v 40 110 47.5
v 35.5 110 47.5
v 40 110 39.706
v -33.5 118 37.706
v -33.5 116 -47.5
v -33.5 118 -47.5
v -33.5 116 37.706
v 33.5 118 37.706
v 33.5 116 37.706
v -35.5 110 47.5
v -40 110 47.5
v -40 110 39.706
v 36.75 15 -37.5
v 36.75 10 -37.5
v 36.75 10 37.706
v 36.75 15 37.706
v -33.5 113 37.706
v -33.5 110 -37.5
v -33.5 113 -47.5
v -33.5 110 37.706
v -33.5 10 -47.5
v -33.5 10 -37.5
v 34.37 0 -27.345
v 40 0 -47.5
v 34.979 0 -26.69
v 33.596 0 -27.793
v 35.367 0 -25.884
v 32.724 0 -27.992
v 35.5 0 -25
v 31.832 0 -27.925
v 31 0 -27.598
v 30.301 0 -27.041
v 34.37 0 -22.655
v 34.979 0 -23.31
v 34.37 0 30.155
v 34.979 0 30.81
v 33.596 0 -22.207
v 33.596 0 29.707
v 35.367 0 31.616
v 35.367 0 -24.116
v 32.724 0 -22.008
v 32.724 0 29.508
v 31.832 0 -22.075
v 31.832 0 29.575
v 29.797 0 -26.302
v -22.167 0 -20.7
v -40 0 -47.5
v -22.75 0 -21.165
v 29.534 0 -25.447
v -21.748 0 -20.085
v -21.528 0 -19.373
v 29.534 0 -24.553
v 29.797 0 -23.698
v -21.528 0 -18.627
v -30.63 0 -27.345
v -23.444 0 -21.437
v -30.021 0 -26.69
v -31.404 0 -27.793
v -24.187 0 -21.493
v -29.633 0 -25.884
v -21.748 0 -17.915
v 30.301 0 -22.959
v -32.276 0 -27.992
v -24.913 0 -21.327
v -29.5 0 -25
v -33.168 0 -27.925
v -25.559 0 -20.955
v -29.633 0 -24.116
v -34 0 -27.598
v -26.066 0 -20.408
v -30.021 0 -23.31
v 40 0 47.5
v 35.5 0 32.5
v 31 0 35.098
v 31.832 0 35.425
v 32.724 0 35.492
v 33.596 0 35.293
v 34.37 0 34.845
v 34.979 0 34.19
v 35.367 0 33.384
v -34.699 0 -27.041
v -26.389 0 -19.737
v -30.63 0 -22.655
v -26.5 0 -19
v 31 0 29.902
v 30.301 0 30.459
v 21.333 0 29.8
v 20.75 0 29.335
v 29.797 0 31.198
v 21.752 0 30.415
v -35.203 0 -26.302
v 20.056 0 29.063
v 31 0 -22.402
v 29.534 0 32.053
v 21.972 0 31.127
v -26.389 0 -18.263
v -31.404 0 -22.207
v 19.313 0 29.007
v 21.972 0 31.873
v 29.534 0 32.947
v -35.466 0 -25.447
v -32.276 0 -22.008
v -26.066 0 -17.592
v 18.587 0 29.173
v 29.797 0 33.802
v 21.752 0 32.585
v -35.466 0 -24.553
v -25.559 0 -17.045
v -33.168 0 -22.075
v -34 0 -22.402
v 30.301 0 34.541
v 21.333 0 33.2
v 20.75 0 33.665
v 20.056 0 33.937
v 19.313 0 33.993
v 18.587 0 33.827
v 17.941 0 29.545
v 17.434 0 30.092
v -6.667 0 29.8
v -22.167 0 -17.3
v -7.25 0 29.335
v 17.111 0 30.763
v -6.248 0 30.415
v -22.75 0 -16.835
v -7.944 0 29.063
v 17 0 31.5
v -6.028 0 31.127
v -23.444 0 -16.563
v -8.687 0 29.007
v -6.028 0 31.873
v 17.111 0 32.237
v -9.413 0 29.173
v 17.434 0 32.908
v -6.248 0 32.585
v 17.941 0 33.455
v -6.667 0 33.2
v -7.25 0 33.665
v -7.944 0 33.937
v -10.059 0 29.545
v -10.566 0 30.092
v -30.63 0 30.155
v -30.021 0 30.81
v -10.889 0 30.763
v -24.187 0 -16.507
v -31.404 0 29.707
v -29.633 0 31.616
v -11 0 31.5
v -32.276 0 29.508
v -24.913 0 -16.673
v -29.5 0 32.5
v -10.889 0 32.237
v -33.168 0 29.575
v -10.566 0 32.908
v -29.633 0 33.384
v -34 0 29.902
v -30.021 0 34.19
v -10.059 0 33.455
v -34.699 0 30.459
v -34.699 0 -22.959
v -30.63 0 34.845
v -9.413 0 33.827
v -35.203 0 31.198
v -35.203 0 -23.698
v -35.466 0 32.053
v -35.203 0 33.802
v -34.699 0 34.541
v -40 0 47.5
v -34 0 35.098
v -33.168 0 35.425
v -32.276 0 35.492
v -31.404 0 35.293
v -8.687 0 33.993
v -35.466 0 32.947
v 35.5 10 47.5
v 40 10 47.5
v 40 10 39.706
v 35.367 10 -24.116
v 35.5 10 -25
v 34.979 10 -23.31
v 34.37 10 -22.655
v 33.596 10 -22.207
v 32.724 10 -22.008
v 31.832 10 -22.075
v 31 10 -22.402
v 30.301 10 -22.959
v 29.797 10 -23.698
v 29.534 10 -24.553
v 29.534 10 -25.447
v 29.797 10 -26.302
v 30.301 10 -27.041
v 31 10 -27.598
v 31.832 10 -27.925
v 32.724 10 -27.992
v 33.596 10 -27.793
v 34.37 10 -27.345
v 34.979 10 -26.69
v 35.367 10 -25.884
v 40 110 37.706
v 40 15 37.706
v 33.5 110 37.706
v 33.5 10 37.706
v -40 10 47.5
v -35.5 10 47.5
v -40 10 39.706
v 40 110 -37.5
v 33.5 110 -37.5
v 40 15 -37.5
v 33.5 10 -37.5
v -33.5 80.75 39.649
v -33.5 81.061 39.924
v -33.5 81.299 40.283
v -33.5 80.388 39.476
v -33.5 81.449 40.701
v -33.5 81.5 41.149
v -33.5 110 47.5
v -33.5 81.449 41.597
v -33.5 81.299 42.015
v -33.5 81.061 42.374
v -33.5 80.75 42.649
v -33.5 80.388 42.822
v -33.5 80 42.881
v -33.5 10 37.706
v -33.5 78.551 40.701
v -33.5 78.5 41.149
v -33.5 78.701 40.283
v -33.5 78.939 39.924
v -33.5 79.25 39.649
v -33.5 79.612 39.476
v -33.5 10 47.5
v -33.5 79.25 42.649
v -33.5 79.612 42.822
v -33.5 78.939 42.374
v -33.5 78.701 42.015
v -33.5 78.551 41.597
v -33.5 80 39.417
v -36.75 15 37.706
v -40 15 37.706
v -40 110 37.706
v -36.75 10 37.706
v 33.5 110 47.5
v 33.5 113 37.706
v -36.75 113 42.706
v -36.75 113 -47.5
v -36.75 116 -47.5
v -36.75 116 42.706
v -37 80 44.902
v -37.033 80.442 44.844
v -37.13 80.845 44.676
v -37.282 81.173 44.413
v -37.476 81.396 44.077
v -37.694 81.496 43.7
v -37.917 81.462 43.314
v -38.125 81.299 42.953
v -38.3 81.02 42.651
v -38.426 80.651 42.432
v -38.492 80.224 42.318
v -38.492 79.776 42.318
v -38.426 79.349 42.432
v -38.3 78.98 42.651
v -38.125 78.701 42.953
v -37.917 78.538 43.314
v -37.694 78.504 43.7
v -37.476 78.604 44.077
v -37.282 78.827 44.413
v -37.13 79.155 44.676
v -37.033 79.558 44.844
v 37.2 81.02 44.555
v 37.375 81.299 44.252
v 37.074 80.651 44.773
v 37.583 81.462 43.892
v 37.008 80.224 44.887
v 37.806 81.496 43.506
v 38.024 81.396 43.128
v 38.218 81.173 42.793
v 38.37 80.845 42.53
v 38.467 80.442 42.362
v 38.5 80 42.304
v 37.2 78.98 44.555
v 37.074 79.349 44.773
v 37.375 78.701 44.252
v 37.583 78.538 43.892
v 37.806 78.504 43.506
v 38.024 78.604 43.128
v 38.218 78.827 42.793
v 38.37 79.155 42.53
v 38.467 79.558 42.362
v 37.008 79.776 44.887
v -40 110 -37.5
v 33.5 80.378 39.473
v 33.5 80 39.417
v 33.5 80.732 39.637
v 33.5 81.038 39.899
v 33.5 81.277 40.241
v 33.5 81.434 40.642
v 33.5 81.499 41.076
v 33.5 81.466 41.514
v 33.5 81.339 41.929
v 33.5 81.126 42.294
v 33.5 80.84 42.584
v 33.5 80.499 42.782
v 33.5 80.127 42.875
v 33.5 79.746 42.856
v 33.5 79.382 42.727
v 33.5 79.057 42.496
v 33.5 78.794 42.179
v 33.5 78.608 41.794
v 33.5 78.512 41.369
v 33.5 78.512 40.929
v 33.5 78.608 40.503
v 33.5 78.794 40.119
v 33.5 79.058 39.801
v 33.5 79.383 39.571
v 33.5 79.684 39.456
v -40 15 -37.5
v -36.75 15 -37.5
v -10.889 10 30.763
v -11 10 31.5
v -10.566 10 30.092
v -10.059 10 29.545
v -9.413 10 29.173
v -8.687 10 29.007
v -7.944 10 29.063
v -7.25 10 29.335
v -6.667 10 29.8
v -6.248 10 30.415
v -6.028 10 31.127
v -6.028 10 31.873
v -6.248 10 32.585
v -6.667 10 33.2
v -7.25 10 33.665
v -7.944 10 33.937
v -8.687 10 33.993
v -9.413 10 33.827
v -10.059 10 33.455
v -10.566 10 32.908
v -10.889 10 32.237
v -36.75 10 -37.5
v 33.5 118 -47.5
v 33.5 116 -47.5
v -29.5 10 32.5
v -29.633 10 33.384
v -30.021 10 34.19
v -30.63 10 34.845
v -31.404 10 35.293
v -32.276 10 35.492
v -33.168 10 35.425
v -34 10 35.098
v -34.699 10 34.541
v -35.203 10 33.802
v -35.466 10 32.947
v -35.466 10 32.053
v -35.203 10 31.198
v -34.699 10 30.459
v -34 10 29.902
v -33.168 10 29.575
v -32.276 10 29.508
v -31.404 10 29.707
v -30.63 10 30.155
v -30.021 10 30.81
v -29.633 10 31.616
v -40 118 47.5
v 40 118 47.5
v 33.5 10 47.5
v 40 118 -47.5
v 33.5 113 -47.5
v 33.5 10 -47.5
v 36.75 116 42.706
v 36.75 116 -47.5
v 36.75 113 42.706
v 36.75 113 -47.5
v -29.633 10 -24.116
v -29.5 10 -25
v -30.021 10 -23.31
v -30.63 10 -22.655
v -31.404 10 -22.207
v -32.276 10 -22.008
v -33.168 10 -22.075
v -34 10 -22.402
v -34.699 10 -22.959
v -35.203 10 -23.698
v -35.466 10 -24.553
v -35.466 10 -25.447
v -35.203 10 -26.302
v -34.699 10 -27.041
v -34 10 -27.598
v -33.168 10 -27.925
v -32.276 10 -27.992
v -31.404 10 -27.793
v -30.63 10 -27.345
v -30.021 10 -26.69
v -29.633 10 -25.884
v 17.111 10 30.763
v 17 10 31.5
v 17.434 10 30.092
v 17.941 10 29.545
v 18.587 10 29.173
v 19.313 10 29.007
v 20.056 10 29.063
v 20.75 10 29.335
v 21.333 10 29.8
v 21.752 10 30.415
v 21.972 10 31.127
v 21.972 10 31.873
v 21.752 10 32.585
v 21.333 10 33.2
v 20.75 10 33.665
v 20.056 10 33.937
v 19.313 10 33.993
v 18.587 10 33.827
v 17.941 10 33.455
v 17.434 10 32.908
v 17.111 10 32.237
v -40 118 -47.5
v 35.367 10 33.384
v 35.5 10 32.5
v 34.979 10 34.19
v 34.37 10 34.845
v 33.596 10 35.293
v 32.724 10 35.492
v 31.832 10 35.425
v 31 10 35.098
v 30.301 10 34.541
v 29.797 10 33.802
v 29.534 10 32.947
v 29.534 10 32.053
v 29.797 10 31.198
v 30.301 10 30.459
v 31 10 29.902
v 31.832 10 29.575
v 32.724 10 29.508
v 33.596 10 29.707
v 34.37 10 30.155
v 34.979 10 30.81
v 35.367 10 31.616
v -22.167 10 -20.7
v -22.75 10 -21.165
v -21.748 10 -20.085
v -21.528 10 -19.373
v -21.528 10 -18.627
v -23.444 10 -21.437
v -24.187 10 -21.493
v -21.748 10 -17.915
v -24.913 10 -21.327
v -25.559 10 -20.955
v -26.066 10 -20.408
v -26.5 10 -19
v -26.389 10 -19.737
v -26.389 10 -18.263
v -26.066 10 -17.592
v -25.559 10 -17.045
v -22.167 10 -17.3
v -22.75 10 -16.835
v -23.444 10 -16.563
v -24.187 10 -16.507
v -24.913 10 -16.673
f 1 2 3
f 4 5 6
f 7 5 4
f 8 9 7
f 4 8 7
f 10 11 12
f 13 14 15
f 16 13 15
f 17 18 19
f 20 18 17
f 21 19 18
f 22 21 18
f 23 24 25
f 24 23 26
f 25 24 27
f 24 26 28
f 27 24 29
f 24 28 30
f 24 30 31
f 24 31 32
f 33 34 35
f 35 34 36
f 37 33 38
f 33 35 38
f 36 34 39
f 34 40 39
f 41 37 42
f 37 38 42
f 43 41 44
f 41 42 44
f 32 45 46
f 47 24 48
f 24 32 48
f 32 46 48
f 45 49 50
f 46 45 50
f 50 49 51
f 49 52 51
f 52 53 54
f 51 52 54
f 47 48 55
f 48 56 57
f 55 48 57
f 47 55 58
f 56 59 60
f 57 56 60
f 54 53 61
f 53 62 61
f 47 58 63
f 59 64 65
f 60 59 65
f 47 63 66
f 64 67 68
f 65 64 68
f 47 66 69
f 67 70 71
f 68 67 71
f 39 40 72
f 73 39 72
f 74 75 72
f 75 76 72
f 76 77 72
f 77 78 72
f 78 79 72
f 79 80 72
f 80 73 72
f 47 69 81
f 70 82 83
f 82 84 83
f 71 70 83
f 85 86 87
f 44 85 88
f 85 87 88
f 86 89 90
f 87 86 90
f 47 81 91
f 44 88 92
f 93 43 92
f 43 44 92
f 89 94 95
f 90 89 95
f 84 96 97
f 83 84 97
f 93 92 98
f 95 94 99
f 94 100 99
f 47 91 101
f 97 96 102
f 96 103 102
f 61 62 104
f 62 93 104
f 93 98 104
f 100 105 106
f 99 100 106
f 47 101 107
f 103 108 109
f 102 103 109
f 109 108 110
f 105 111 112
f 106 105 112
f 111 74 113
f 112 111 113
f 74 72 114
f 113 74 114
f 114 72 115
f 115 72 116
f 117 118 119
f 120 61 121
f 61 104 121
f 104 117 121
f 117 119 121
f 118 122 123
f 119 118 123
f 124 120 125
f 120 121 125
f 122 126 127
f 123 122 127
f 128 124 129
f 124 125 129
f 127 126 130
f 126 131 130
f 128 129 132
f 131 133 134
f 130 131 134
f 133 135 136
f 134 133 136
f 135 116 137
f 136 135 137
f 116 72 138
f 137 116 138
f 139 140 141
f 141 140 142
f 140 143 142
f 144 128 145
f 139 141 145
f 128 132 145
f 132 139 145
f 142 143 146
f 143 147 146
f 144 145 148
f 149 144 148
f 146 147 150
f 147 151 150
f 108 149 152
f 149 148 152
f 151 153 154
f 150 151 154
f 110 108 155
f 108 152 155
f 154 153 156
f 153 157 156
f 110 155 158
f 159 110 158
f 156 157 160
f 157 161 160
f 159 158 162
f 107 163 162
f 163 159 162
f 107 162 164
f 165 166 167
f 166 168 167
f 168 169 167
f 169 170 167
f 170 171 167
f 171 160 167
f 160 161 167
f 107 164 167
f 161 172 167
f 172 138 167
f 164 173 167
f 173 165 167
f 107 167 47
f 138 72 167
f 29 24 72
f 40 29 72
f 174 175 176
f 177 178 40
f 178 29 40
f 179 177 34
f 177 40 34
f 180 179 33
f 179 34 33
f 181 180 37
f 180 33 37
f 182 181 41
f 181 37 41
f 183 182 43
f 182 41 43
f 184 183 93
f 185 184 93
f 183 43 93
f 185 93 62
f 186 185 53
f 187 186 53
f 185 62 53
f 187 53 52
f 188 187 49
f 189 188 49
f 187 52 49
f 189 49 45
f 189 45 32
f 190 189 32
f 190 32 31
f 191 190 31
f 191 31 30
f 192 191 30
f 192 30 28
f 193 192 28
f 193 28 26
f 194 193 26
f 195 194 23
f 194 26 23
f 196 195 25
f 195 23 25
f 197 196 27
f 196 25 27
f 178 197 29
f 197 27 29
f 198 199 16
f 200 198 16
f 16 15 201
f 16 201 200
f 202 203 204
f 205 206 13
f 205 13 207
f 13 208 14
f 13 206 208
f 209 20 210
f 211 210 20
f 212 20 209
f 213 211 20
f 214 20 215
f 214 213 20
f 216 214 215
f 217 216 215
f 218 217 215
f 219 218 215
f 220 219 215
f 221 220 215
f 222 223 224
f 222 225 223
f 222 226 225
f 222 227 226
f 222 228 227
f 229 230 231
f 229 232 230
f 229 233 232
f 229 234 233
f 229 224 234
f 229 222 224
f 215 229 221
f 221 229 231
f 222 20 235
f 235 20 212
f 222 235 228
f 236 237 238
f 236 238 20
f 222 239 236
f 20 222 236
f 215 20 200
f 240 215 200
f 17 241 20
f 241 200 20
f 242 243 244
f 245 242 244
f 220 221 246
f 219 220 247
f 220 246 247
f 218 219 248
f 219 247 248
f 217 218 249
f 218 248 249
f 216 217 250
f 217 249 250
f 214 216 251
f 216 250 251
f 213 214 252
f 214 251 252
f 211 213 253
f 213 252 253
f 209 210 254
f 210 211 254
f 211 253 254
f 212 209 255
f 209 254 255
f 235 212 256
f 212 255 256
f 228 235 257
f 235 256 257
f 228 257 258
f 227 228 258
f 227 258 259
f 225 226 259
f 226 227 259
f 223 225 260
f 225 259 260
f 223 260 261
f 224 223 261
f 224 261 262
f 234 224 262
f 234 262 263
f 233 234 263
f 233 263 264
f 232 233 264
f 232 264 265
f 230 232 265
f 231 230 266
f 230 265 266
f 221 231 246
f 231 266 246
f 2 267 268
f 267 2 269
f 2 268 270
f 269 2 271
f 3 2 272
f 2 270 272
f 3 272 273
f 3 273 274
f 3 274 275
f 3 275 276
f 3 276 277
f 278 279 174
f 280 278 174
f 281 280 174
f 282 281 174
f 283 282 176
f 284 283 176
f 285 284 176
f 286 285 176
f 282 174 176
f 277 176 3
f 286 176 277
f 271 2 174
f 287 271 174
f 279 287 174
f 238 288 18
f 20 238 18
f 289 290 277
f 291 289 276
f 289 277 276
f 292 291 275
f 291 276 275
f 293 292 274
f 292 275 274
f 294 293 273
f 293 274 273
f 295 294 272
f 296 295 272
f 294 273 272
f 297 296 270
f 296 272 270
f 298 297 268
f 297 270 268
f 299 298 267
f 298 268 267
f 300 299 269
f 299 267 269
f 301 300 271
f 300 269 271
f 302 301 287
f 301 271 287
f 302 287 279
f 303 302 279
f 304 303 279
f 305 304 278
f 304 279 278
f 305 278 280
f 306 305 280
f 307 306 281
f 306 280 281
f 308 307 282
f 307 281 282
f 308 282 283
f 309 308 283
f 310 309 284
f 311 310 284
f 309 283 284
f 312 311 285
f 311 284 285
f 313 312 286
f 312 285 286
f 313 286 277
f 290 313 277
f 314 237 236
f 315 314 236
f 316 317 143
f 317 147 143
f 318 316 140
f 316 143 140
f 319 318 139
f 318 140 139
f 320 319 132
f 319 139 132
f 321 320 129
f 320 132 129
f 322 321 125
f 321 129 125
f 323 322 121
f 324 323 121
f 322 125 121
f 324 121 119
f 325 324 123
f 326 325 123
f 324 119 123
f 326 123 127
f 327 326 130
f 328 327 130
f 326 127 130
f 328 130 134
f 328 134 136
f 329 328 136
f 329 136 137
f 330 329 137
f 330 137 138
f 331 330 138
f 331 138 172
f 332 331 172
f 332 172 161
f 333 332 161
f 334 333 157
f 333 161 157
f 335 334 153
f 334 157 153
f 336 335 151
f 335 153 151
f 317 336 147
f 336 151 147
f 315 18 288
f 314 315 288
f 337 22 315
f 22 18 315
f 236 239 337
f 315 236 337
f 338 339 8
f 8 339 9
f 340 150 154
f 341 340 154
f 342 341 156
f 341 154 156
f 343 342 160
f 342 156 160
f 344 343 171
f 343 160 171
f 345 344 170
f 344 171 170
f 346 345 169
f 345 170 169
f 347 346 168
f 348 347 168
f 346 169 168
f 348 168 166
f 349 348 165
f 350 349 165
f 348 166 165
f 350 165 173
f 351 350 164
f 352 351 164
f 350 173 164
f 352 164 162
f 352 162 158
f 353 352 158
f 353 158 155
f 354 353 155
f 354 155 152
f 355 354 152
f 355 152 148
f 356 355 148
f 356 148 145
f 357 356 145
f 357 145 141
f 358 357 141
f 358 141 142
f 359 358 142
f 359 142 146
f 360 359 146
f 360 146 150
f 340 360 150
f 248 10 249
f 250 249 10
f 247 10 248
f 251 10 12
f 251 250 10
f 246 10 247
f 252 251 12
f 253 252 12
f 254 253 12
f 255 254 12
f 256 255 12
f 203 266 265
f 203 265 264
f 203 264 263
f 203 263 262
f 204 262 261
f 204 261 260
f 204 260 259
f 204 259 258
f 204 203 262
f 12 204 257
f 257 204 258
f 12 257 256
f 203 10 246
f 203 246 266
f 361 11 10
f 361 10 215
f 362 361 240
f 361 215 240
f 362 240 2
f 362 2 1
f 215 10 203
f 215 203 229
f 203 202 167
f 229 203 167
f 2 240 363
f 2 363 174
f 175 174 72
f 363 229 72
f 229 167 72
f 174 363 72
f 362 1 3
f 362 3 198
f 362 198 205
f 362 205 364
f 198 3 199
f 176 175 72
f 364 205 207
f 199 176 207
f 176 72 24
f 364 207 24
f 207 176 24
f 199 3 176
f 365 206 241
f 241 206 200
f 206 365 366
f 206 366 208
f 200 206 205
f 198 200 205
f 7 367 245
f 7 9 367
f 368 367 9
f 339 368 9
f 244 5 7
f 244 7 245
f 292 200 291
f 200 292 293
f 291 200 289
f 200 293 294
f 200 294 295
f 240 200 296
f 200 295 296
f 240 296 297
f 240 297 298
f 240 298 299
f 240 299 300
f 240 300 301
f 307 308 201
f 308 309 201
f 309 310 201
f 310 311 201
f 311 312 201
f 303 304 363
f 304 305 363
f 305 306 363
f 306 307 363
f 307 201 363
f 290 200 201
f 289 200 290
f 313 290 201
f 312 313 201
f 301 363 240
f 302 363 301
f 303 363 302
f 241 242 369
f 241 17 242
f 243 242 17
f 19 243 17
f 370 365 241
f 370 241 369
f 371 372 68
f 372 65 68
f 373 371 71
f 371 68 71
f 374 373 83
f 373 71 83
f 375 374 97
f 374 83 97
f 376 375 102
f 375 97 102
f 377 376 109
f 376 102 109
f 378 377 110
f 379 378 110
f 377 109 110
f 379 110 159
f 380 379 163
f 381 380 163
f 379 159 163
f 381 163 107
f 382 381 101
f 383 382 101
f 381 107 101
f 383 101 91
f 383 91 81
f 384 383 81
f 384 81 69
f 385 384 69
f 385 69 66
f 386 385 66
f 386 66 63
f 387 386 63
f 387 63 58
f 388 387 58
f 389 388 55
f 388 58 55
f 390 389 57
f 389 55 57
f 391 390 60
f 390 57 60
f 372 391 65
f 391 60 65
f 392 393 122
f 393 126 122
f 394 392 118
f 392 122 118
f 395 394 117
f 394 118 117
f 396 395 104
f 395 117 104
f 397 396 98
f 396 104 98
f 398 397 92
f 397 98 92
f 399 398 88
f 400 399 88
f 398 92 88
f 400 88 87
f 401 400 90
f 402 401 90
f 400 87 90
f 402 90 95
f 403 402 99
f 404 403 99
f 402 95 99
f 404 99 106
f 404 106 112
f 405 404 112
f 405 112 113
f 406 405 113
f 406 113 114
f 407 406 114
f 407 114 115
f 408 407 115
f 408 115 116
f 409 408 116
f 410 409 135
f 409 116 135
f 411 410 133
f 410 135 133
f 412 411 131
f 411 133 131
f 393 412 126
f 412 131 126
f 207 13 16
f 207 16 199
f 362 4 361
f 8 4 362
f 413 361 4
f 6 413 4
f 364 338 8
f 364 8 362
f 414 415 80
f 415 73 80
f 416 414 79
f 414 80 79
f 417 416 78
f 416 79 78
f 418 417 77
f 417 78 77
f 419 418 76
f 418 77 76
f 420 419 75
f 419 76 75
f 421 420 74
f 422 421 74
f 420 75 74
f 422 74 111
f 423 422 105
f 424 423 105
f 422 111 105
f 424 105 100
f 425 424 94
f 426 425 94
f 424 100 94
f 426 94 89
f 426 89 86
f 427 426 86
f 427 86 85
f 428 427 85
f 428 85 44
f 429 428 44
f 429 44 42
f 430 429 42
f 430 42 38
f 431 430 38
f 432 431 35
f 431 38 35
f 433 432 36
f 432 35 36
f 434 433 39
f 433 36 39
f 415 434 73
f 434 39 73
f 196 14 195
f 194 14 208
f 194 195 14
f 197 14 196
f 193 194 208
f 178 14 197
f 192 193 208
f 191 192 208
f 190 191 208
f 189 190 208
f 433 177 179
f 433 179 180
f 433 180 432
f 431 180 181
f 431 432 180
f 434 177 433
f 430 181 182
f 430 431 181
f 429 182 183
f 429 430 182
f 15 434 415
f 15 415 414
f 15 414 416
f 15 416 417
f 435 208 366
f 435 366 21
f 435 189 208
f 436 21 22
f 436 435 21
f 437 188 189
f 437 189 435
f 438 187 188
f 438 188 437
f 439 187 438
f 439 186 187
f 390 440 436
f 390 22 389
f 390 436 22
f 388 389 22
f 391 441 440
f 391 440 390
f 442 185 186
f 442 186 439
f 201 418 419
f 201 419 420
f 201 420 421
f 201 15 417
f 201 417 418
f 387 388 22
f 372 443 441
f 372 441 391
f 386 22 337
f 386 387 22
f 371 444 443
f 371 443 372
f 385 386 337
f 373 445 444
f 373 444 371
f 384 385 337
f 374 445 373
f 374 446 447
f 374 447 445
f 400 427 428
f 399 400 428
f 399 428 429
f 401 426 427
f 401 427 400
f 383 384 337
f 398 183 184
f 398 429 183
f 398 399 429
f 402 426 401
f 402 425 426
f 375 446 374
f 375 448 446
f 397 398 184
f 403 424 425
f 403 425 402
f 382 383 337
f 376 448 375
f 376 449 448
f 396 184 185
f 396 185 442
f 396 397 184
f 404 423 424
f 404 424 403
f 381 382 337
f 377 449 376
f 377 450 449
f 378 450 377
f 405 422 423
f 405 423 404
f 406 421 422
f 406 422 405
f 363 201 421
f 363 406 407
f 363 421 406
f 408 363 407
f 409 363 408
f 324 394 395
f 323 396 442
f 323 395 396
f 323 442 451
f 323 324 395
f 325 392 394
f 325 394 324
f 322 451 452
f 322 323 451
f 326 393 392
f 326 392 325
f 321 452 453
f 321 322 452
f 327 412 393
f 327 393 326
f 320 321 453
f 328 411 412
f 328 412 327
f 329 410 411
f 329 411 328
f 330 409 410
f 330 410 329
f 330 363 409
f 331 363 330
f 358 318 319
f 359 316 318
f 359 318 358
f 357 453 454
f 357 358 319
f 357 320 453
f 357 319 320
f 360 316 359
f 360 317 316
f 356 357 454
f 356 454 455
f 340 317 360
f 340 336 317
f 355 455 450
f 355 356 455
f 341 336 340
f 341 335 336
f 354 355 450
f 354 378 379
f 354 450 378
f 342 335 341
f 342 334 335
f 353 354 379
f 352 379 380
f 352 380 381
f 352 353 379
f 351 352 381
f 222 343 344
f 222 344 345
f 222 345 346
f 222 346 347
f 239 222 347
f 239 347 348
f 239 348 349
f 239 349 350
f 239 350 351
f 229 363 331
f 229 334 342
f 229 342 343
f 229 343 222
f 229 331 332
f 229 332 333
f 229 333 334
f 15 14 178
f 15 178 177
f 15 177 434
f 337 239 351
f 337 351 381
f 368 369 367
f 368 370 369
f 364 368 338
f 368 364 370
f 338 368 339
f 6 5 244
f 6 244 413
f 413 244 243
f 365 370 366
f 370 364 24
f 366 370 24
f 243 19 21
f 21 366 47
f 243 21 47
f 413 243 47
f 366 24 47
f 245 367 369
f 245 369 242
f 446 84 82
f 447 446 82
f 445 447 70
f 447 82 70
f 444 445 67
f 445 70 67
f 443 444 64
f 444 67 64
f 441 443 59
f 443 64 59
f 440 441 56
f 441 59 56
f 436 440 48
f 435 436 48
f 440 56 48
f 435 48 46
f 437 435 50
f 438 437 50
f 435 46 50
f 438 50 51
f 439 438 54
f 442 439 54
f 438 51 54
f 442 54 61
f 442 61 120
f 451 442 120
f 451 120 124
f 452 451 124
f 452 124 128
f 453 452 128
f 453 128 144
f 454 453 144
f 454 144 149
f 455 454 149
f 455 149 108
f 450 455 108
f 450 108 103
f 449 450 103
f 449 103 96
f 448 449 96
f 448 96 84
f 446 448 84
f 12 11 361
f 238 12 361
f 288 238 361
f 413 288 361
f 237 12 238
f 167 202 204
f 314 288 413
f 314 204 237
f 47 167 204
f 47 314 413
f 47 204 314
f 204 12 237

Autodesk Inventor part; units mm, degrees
ref_plane "YZ Plane" through (0, 0, 0) normal (1, 0, 0) x (0, 1, 0)
ref_plane "XZ Plane" through (0, 0, 0) normal (0, 1, 0) x (-1, 0, 0)
ref_plane "XY Plane" through (0, 0, 0) normal (0, 0, 1) x (1, 0, 0)
sketch "Sketch1" plane through (0, 0, 0) normal (0, 1, 0) x (-1, 0, 0)
  line L0 (-40, -47.5) -> (40, -47.5)
  line L1 (40, -47.5) -> (40, 47.5)
  line L2 (40, 47.5) -> (-40, 47.5)
  line L3 (-40, 47.5) -> (-40, -47.5)
  line L4 (-40, -47.5) -> (40, 47.5) construction
  line L5 (40, -47.5) -> (-40, 47.5) construction
  line L6 (25.5, 17) -> (28.5, 17)
  line L7 (0, 17.5) -> (0, 19)
  line L8 (0, 0) -> (2.25, 0)
  line L9 (0, 0) -> (0, 17.5)
  line L10 (-27.5, -36.75) -> (-27.5, 38.25)
  line L11 (-27.5, 38.25) -> (28.5, -36.75) construction
  line L12 (28.5, 38.25) -> (-27.5, -36.75) construction
  line L13 (28.5, 38.25) -> (28.5, -36.75)
  line L14 (28.5, 17) -> (28.5, -36.75)
  line L15 (28.5, -36.75) -> (-27.5, -36.75)
  line L16 (0, -31.5) -> (8.5, -31.5)
  line L17 (0, 0) -> (0, -31.5)
  line L18 (0, -31.5) -> (-19.5, -31.5)
  line L19 (-19.5, -31.5) -> (-19.5, -36.75)
  line L20 (-27.5, 38.25) -> (28.5, 38.25)
  line L21 (0, 19) -> (24, 19)
  line L22 (0, 0) -> (0, 31.5)
  line L23 (28.5, -17) -> (28.5, 36.75)
  line L24 (28.5, -38.25) -> (28.5, 36.75)
  line L25 (28.5, -38.25) -> (-27.5, 36.75) construction
  line L26 (-27.5, 36.75) -> (-27.5, -38.25)
  line L27 (-27.5, -38.25) -> (28.5, 36.75) construction
  line L28 (0, 31.5) -> (8.5, 31.5)
  circle A0 centre (8.5, 31.5) radius 2.5
  line L29 (0, 31.5) -> (-19.5, 31.5)
  circle A1 centre (-19.5, 31.5) radius 2.5
  circle A2 centre (-19.5, 31.5) radius 2.5
  line L30 (-19.5, 31.5) -> (-19.5, 36.75)
  line L31 (28.5, 36.75) -> (-27.5, 36.75)
  line L32 (0, 0) -> (0, -17.5)
  line L33 (0, -17.5) -> (0, -19)
  line L34 (25.5, -17) -> (28.5, -17)
  line L35 (0, -19) -> (24, -19)
  line L36 (-27.5, -38.25) -> (28.5, -38.25)
  circle A3 centre (24, -19) radius 2.5
  point P0 (0.5, 0.75)
  point P1 (0.5, -0.75)
  dimension "d0" = 80
  dimension "d1" = 95
  dimension "d5" = 17.5
  dimension "d6" = 8.5
  dimension "d7" = 19.5
  dimension "d8" = 31.5
  dimension "d9" = 24
  dimension "d11" = 2.25
  dimension "d12" = 56
  dimension "d13" = 75
  dimension "d14" = 5.25
  dimension "d15" = 3
ref_plane "Work Plane3" through (0, 10, 0) normal (0, 1, 0) x (1, 0, 0)
sketch "Sketch2" plane through (0, 10, 0) normal (0, 1, 0) x (1, 0, 0)
  line L0 (35.5, -47.5) -> (40, -39.7058)
  line L1 (35.5, -47.5) -> (44.5, -47.5) construction
  line L2 (40, -39.7058) -> (35.5, -39.7058)
  line L3 (35.5, -39.7058) -> (35.5, -47.5)
  line L4 (-40, -47.5) -> (40, -47.5) projected
  line L5 (40, -47.5) -> (40, 47.5) projected
  line L6 (40, -37.7058) -> (33.5, -37.7058)
  line L7 (33.5, -37.7058) -> (33.5, -47.5)
  line L8 (33.5, -47.5) -> (35.5, -47.5)
  line L9 (40, -39.7058) -> (40, -37.7058)
  line L10 (0, -47.5) -> (0, 47.5)
  line L11 (-35.5, -47.5) -> (-40, -39.7058)
  line L12 (-35.5, -47.5) -> (-44.5, -47.5) construction
  line L13 (-40, -39.7058) -> (-35.5, -39.7058)
  line L14 (-35.5, -39.7058) -> (-35.5, -47.5)
  line L15 (-40, -37.7058) -> (-33.5, -37.7058)
  line L16 (-33.5, -37.7058) -> (-33.5, -47.5)
  line L17 (-33.5, -47.5) -> (-35.5, -47.5)
  line L18 (-40, -39.7058) -> (-40, -37.7058)
  line L19 (40, 47.5) -> (-40, 47.5) projected
  line L20 (-40, 47.5) -> (-33.5, 47.5)
  line L21 (-33.5, 47.5) -> (-33.5, 37.5)
  line L22 (-33.5, 37.5) -> (-40, 37.5)
  line L23 (-40, 37.5) -> (-40, 47.5)
  line L24 (40, 47.5) -> (33.5, 47.5)
  line L25 (33.5, 47.5) -> (33.5, 37.5)
  line L26 (33.5, 37.5) -> (40, 37.5)
  line L27 (40, 37.5) -> (40, 47.5)
  point P0 (0, 0)
  dimension "d18" = 9
  dimension "d19" = 60
  dimension "d20" = 2
  dimension "d21" = 9.7942
  dimension "d22" = 6.5
  dimension "d23" = 6.5
  dimension "d24" = 10
  dimension "d25" = 6.5
  dimension "d26" = 10
extrude "Extrusion2" add sketch "Sketch2" along normal blind 100 contours L3 L2 L0 | L4 L7 L6 L5 L2 L3 | L26 L25 L19 L5 | L14 L13 L18 L15 L16 L4 | L11 L13 L14 | L21 L22 L23 L19
ref_plane "Work Plane2" through (0, 10, 0) normal (0, 1, 0) x (1, 0, 0)
sketch "Sketch3" plane through (0, 10, 0) normal (0, 1, 0) x (1, 0, 0)
  line L0 (-40, 37.5) -> (-40, -37.7058) projected
  line L1 (-33.5, 37.5) -> (-40, 37.5) projected
  line L2 (-40, -37.7058) -> (-36.75, -37.7058)
  line L3 (-36.75, -37.7058) -> (-36.75, 37.5)
  line L4 (-36.75, 37.5) -> (-40, 37.5)
  line L5 (-40, 37.5) -> (-40, -37.7058)
  line L6 (33.5, 37.5) -> (40, 37.5) projected
  line L7 (40, -37.7058) -> (33.5, -37.7058) projected
  line L8 (40, 37.5) -> (36.75, 37.5)
  line L9 (36.75, 37.5) -> (36.75, -37.7058)
  line L10 (36.75, -37.7058) -> (40, -37.7058)
  line L11 (40, -37.7058) -> (40, 37.5)
  point P0 (0, 0)
extrude "Extrusion3" add sketch "Sketch3" along normal blind 5
ref_plane "Work Plane4" through (0, 110, 0) normal (0, 1, 0) x (1, 0, 0)
sketch "Sketch4" plane through (0, 110, 0) normal (0, 1, 0) x (1, 0, 0)
  line L0 (-33.5, 47.5) -> (-40, 47.5) projected
  line L1 (-40, -47.5) -> (40, -47.5) projected
  line L2 (-40, 47.5) -> (-33.5, 47.5)
  line L3 (-33.5, 47.5) -> (-33.5, -47.5)
  line L4 (-33.5, -47.5) -> (-40, -47.5)
  line L5 (-40, -47.5) -> (-40, 47.5)
  line L6 (40, 37.5) -> (40, 47.5) projected
  line L7 (40, 47.5) -> (33.5, 47.5)
  line L8 (33.5, 47.5) -> (33.5, -47.5)
  line L9 (33.5, -47.5) -> (40, -47.5)
  line L10 (40, -47.5) -> (40, 47.5)
  line L11 (40, -37.7058) -> (33.5, -37.7058) projected
  line L12 (33.5, -37.7058) -> (-33.5, -37.7058)
  line L13 (-33.5, -37.7058) -> (-33.5, -47.5)
  line L14 (-33.5, -47.5) -> (33.5, -47.5)
  line L15 (33.5, -47.5) -> (33.5, -37.7058)
  point P0 (0, 0)
extrude "Extrusion4" add sketch "Sketch4" along normal blind 8
ref_plane "Work Plane8" through (40, 0, -47.5) normal (0, 0, -1) x (-1, 0, 0)
sketch "Sketch5" plane through (40, 0, -47.5) normal (0, 0, -1) x (-1, 0, 0)
  line L0 (73.5, 110) -> (6.5, 110) projected
  line L1 (6.5, 110) -> (6.5, 113)
  line L2 (6.5, 10) -> (6.5, 118) projected
  line L3 (6.5, 113) -> (3.25, 113)
  line L4 (3.25, 113) -> (3.25, 116)
  line L5 (3.25, 116) -> (6.5, 116)
  line L6 (6.5, 116) -> (6.5, 113)
  line L7 (73.5, 10) -> (73.5, 118) projected
  line L8 (6.5, 116) -> (73.5, 116)
  line L9 (73.5, 116) -> (73.5, 113)
  line L10 (73.5, 113) -> (6.5, 113)
  line L11 (6.5, 113) -> (6.5, 116)
  line L12 (73.5, 113) -> (76.75, 113)
  line L13 (76.75, 113) -> (76.75, 116)
  line L14 (76.75, 116) -> (73.5, 116)
  line L15 (73.5, 116) -> (73.5, 113)
  point P0 (40, 0)
  dimension "d33" = 3
  dimension "d34" = 3
  dimension "d35" = 3.25
  dimension "d36" = 3.25
extrude "Extrusion5" cut sketch "Sketch5" against normal blind 90.206 contours L10 L2 L8 L7 | L7 L14 L13 L12 | L3 L4 L5 L2
ref_plane "Work Plane7" through (40, 10, 39.7058) normal (0.8660254, 0, 0.5) x (0.5, 0, -0.8660254)
sketch "Sketch6" plane through (40, 10, 39.7058) normal (0.8660254, 0, 0.5) x (0.5, 0, -0.8660254)
  line L0 (-9, 0) -> (-9, 100) projected
  line L1 (0, 0) -> (-9, 0) projected
  line L2 (-9, 100) -> (0, 100)
  line L3 (0, 100) -> (0, 0)
  line L4 (0, 0) -> (-9, 0)
  line L5 (-9, 0) -> (-9, 100)
  line L6 (0, 100) -> (0, 70)
  line L7 (0, 0) -> (0, 100) projected
  line L8 (0, 70) -> (-4.5, 70)
  circle A0 centre (-4.5, 70) radius 1.5
  point P0 (14.3862, -10)
  dimension "d39" = 30
  dimension "d40" = 3
extrude "Extrusion6" cut sketch "Sketch6" against normal blind 6 contours A0
ref_plane "Work Plane6" through (-35.5, 10, 47.5) normal (-0.8660254, 0, 0.5) x (0.5, 0, 0.8660254)
sketch "Sketch7" plane through (-35.5, 10, 47.5) normal (-0.8660254, 0, 0.5) x (0.5, 0, 0.8660254)
  line L0 (-9, 0) -> (-9, 100) projected
  line L1 (0, 0) -> (0, 100) projected
  line L2 (-9, 100) -> (0, 100)
  line L3 (0, 100) -> (0, 0)
  line L4 (0, 0) -> (-9, 0)
  line L5 (-9, 0) -> (-9, 100)
  line L6 (-9, 100) -> (-9, 70)
  line L7 (-9, 70) -> (-4.5, 70)
  circle A0 centre (-4.5, 70) radius 1.5
  point P0 (-23.3862, -10)
  dimension "d43" = 30
  dimension "d44" = 3
extrude "Extrusion7" cut sketch "Sketch7" against normal blind 6 contours A0
ref_plane "Work Plane5" through (40, 0, 47.5) normal (1, 0, 0) x (0, 0, -1)
sketch "Sketch8" plane through (40, 0, 47.5) normal (1, 0, 0) x (0, 0, -1)
  line L0 (85, 110) -> (9.7942, 110) projected
  line L1 (85, 110) -> (95, 110)
  line L2 (95, 110) -> (95, 80)
  line L3 (95, 80) -> (85, 80)
  line L4 (85, 80) -> (85, 110)
  circle A0 centre (90, 80) radius 1.5
  point P0 (47.5, 0)
  dimension "d47" = 10
  dimension "d48" = 30
  dimension "d49" = 3
extrude "Extrusion8" [suppressed]
ref_plane "Work Plane1" through (0, 0, 0) normal (0, -1, 0) x (1, 0, 0)
sketch "Sketch9" plane through (0, 0, 0) normal (0, -1, 0) x (1, 0, 0)
  line L0 (40, 47.5) -> (40, 39.7058) projected
  line L1 (40, 47.5) -> (25, 47.5)
  line L2 (25, 47.5) -> (25, -10)
  line L3 (25, -10) -> (40, -10)
  line L4 (40, -10) -> (40, 47.5)
  line L5 (-40, 47.5) -> (-35.5, 47.5) projected
  line L6 (-40, 47.5) -> (-25, 47.5)
  line L7 (-25, 47.5) -> (-25, -10)
  line L8 (-25, -10) -> (-40, -10)
  line L9 (-40, -10) -> (-40, 47.5)
  line L10 (-40, 47.5) -> (40, 47.5) projected
  line L11 (-40, 47.5) -> (-32.5, 47.5)
  line L12 (-33.5, 47.5) -> (-33.5, 37.7058) projected
  line L13 (-40, 47.5) -> (-33.5, 47.5)
  line L14 (-33.5, 47.5) -> (-29, 47.5)
  line L15 (-40, 47.5) -> (-32.5, 47.5)
  line L16 (-32.5, 47.5) -> (-32.5, 32.5)
  circle A0 centre (-32.5, 32.5) radius 3
  line L17 (-32.5, -10) -> (-32.5, -25)
  circle A1 centre (-32.5, -25) radius 3
  line L18 (32.5, 47.5) -> (32.5, 32.5)
  line L19 (32.5, -10) -> (32.5, -25)
  circle A2 centre (32.5, -25) radius 3
  circle A3 centre (32.5, 32.5) radius 3
  point P0 (0, 0)
  dimension "d52" = 15
  dimension "d53" = 57.5
  dimension "d54" = 15
  dimension "d55" = 57.5
  dimension "d61" = 7.5
  dimension "d62" = 15
  dimension "d63" = 6
  dimension "d64" = 15
  dimension "d65" = 6
  dimension "d66" = 15
  dimension "d67" = 15
  dimension "d68" = 6
  dimension "d69" = 6
extrude "Extrusion9" add sketch "Sketch1" along normal blind 10 contours L3 L2 L1 L0 | L9 L17 L18 L19 L15 L10 L31 L30 A1 L29 L22 L7 | L7 L22 L29 A1 L30 L31 L13 L34 A3 L35 L17 L9 | L35 A3 L34 L13 L15 L19 L18 L17 | L31 L10 L20 L13 | L15 L24 L36 L26
extrude "Extrusion11" cut sketch "Sketch9" against normal up to surface (10 mm away) contours A0 | A1 | A2 | A3
equation "\"d72\" = d68"
properties part number "Base"
